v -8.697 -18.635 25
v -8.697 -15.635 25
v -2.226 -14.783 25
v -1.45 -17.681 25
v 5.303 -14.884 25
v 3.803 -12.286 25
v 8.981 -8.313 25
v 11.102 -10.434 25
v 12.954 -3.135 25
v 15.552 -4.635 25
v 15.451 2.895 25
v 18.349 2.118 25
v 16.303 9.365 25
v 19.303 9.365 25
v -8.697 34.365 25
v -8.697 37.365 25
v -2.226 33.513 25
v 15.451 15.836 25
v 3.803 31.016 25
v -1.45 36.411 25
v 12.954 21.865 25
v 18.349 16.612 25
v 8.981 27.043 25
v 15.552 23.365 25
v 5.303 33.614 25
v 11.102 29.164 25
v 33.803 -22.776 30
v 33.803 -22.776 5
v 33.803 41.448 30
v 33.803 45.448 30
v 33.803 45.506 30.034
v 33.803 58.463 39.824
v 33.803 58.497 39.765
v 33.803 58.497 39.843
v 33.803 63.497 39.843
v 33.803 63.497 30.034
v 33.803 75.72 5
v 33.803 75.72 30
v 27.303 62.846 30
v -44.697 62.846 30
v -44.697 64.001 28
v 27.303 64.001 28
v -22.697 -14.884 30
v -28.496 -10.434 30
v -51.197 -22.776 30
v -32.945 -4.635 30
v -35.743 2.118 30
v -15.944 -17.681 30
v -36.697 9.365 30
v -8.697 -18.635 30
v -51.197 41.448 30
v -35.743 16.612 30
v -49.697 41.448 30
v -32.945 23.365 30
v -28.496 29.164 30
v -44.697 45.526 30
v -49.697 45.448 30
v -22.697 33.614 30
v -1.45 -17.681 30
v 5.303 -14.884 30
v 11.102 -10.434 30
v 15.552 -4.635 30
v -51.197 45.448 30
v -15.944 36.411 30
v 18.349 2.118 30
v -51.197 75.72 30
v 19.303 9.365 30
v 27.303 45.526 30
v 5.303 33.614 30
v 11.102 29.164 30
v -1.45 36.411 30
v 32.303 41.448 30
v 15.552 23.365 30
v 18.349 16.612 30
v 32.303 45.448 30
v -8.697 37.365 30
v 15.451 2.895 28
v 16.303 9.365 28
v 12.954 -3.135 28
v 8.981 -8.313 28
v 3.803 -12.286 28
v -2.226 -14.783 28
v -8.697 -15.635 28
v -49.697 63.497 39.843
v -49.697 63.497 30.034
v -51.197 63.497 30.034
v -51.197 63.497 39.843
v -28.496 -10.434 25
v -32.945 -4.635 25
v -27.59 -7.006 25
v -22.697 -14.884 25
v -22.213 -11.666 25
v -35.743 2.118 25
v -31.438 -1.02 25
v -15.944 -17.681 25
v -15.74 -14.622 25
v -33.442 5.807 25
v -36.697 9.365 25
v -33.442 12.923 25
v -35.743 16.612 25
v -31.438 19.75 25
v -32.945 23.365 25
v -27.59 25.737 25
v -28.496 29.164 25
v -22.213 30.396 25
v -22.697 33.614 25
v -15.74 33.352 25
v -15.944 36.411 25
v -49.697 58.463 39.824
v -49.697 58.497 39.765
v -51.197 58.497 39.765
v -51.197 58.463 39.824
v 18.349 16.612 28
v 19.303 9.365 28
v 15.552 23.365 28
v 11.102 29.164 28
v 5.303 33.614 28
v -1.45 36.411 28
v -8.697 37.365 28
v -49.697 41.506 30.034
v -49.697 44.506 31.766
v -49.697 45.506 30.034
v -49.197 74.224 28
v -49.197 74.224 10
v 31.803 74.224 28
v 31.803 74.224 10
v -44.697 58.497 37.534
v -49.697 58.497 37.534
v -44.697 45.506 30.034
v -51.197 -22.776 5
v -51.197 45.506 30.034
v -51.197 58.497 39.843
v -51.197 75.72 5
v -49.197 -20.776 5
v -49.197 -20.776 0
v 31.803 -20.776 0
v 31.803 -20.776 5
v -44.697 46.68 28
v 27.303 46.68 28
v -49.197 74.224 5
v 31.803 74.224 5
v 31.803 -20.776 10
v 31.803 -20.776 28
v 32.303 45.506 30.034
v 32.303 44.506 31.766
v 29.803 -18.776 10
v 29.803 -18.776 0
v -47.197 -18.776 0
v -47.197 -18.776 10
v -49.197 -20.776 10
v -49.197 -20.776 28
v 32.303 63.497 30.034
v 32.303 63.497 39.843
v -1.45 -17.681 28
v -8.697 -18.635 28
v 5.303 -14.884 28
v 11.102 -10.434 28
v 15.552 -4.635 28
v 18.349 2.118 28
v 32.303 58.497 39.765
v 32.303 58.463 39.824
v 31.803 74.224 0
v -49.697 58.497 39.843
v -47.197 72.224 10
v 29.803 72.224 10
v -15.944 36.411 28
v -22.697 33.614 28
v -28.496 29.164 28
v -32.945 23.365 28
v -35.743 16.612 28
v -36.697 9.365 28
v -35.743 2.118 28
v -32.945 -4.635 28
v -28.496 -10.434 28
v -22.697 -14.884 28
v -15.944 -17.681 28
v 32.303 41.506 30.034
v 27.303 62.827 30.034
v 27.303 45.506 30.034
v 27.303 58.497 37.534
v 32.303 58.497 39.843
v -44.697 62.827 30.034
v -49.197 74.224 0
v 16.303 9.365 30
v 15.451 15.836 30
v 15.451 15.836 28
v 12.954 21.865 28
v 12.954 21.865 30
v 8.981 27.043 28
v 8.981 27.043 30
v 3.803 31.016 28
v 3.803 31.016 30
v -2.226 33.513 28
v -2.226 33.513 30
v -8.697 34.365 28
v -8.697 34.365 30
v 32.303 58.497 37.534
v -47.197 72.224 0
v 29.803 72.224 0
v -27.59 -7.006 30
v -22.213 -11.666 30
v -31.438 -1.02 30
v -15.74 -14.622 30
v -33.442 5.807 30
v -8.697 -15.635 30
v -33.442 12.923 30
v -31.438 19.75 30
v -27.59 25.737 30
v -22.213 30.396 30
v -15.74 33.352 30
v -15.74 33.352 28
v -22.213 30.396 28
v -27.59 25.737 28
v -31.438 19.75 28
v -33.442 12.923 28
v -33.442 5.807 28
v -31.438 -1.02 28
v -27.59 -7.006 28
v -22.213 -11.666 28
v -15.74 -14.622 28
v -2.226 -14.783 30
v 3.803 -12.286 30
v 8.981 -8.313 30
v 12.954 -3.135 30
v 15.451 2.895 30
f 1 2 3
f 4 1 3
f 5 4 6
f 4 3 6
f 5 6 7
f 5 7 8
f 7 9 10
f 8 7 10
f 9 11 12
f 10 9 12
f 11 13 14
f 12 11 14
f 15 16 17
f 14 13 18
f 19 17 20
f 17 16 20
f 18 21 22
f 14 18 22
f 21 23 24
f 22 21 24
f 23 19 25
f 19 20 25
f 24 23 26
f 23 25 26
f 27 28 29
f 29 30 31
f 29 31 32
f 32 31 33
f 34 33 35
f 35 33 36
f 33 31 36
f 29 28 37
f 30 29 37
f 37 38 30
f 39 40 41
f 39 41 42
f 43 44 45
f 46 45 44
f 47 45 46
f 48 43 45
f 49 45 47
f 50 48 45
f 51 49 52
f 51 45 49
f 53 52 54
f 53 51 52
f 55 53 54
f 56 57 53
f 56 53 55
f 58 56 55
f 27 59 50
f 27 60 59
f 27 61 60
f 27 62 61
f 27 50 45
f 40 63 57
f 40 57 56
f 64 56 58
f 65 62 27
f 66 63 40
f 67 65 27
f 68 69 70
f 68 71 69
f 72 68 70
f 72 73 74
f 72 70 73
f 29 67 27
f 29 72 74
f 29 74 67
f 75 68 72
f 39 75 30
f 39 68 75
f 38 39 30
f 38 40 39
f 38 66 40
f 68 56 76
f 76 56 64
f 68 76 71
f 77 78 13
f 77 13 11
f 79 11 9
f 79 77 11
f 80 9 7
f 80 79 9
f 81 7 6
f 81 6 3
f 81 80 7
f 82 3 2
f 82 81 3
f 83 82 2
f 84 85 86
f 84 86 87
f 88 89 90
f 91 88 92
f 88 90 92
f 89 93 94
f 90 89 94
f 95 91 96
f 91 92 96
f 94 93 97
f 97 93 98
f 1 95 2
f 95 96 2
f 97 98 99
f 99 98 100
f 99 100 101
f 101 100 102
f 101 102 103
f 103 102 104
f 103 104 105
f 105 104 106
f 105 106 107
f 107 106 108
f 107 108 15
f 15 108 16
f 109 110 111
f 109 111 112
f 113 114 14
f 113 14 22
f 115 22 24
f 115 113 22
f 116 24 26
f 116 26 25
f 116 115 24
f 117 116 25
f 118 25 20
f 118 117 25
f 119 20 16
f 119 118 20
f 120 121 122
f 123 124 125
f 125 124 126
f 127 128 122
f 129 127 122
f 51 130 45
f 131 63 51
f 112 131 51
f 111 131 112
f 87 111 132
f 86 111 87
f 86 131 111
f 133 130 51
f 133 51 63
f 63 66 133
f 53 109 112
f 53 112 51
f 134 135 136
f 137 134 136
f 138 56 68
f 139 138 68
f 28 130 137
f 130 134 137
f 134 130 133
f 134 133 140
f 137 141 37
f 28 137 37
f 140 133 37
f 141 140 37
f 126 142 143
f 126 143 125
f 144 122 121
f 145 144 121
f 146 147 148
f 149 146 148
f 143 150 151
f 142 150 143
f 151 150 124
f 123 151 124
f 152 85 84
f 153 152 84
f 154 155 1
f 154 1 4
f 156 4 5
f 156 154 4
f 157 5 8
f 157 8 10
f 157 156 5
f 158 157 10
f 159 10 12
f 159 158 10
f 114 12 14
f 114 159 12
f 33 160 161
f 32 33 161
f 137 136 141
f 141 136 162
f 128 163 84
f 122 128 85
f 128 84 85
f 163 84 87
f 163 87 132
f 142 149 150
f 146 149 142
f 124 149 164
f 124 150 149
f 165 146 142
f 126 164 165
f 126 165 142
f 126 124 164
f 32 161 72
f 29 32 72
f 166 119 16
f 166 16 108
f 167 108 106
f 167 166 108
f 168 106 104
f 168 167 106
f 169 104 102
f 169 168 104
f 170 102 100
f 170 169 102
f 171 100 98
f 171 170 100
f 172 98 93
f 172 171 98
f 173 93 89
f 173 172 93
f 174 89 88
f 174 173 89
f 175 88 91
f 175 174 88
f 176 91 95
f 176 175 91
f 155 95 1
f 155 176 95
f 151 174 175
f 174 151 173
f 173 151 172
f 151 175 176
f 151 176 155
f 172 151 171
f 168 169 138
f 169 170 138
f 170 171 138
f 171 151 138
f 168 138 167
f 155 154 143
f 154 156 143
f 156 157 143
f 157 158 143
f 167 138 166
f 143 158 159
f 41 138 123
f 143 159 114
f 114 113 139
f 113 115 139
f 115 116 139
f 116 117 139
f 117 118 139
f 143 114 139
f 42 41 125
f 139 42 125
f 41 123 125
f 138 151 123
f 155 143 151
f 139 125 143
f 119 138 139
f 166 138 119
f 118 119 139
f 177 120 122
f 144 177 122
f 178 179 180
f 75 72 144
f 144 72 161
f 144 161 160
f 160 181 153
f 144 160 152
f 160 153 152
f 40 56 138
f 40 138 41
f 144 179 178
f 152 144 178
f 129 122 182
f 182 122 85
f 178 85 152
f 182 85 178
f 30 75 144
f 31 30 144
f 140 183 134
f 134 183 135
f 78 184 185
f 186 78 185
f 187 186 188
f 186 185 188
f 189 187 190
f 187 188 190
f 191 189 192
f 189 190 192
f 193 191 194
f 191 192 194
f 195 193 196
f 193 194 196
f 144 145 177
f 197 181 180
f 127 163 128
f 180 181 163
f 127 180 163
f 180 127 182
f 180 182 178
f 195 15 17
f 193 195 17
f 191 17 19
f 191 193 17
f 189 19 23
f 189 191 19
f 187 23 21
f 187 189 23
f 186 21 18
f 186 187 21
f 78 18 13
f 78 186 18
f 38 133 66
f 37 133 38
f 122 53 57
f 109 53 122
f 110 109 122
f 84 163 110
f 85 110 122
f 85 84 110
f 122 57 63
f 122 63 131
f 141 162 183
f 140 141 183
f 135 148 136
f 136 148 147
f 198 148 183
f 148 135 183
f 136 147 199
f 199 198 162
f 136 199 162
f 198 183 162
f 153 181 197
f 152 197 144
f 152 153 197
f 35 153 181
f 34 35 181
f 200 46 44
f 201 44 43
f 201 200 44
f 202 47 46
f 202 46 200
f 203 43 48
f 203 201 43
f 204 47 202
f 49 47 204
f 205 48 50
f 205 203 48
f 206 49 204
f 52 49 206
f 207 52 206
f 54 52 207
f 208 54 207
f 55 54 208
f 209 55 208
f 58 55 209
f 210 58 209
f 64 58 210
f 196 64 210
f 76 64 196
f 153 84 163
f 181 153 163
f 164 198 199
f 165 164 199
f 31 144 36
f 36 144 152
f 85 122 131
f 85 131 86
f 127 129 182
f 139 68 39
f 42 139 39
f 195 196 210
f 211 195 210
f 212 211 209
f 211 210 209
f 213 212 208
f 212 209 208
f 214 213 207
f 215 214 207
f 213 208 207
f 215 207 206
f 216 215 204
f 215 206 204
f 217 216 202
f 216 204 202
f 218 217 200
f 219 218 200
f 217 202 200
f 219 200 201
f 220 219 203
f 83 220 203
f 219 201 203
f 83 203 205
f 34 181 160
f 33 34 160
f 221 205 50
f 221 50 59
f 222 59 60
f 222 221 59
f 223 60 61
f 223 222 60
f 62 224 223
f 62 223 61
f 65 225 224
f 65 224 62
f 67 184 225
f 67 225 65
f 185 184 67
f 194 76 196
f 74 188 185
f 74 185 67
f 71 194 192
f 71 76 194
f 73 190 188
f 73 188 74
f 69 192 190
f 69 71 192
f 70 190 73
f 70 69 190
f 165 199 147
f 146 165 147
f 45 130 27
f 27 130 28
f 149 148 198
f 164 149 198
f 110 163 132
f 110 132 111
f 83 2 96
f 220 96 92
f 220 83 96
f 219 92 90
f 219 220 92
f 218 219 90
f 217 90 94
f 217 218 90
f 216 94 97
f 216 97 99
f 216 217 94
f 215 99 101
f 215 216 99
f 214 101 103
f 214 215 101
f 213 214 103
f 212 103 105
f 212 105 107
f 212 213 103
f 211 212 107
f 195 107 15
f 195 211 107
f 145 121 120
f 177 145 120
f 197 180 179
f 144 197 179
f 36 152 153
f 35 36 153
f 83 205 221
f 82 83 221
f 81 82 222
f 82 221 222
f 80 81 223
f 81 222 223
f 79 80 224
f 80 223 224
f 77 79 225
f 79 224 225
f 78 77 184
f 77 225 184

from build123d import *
from build123d.topology import SkipClean

# Parameters (mm, degrees)
SKETCH1_W                  = 2
SKETCH1_H                  = 2
BOSS_EXTRUDE1_DEPTH        = 10
BOSS_EXTRUDE3_DEPTH        = 20
BOSS_EXTRUDE3_DEPTH_BACK   = 5
SKETCH2_W                  = 85
SKETCH2_H                  = 98.49643328
SKETCH2_W_2                = 81
SKETCH2_H_2                = 95
SKETCH3_W                  = 81
SKETCH3_H                  = 95
BOSS_EXTRUDE4_DEPTH        = 2
BOSS_EXTRUDE6_DEPTH        = 41
BOSS_EXTRUDE6_DEPTH_BACK   = 41
BOSS_EXTRUDE6_2_DEPTH      = 41
BOSS_EXTRUDE6_2_DEPTH_BACK = 41
BOSS_EXTRUDE7_DEPTH        = 1.5
SKETCH15_W                 = 72
SKETCH15_H                 = 15
CUT_EXTRUDE2_DEPTH         = 15
CUT_EXTRUDE3_DEPTH         = 10
BOSS_EXTRUDE8_DEPTH        = 5


# Read off the part's stored shape, not the designer's step: Boss-Extrude7
with BuildPart() as part:
    # Sketch1 → Boss-Extrude1 (new body)
    with BuildSketch(Plane.XY):
        Polygon((-49.196743418, -18.776119502), (-47.196743418, -18.776119502), (-47.196743418, 72.223880498), (-24.196743418, 72.223880498), (-22.196743418, 72.223880498), (29.803256582, 72.223880498), (29.803256582, 74.223880498), (-49.196743418, 74.223880498), align=None)
        Polygon((-24.196743418, -18.776119502), (-47.196743418, -18.776119502), (-47.196743418, -20.776119502), (31.803256582, -20.776119502), (31.803256582, 72.223880498), (29.803256582, 72.223880498), (29.803256582, -18.776119502), (-22.196743418, -18.776119502), align=None)
        with Locations((-48.196743418, -19.776119502)):
            Rectangle(SKETCH1_W, SKETCH1_H)
        with Locations((30.803256582, 73.223880498)):
            Rectangle(SKETCH1_W, SKETCH1_H)
    extrude(amount=BOSS_EXTRUDE1_DEPTH)

    # Sketch2 → Boss-Extrude3 (add, two sides: drawn at the far end of the back side and taken through both)
    with BuildSketch(Plane.XY.offset(10).offset(-BOSS_EXTRUDE3_DEPTH_BACK)):
        with Locations((-8.696743418, 26.472097138)):
            Rectangle(SKETCH2_W, SKETCH2_H)
        with Locations((-8.696743418, 26.723880498)):
            Rectangle(SKETCH2_W_2, SKETCH2_H_2, mode=Mode.SUBTRACT)
    extrude(amount=BOSS_EXTRUDE3_DEPTH + BOSS_EXTRUDE3_DEPTH_BACK)

    # Sketch3 → Boss-Extrude4 (add)
    with BuildSketch(Plane.XY.offset(30)):
        with Locations((-8.696743418, 26.723880498)):
            Rectangle(SKETCH3_W, SKETCH3_H)
    extrude(amount=-BOSS_EXTRUDE4_DEPTH)

    # Boss-Extrude7 outline → Boss-Extrude7 (add)
    with BuildSketch(Plane(origin=(32.303256582, 0, 0), x_dir=(0, 0, -1), z_dir=(1, 0, 0))):
        Polygon((-39.842927076, 63.496736875), (-39.842927076, 58.496736875), (-39.765386314, 58.496736875), (-39.823541886, 58.46316074), (-30, 41.448287084), (-30, 45.448287084), (-30.033525999, 45.506355818), (-30.033525999, 63.496736875), align=None)
    boss_extrude7 = extrude(amount=BOSS_EXTRUDE7_DEPTH)

    # Mirror2: Boss-Extrude7 across plane
    add(boss_extrude7.mirror(Plane(origin=(-8.696743418, 0, 0), x_dir=(0, 0, 1), z_dir=(1, 0, 0))))


with BuildPart() as body_2:
    # Sketch9 → Boss-Extrude6 (new, two sides: drawn at the far end of the back side and taken through both)
    with BuildSketch(Plane(origin=(-8.696743418, 0, 0), x_dir=(0, 0, -1), z_dir=(1, 0, 0)).offset(-BOSS_EXTRUDE6_DEPTH_BACK)):
        Polygon((-30.033525999, 45.506355818), (-30.033525999, 63.496736875), (-39.842927076, 63.496736875), (-39.842927076, 58.496736875), (-37.533525999, 58.496736875), align=None)
    extrude(amount=BOSS_EXTRUDE6_DEPTH + BOSS_EXTRUDE6_DEPTH_BACK)


with BuildPart() as body_3:
    # Sketch9 → Boss-Extrude6 2 (new, two sides: drawn at the far end of the back side and taken through both)
    with BuildSketch(Plane(origin=(-8.696743418, 0, 0), x_dir=(0, 0, -1), z_dir=(1, 0, 0)).offset(-BOSS_EXTRUDE6_2_DEPTH_BACK)):
        Polygon((-30.033525999, 41.506355818), (-30.033525999, 45.506355818), (-31.765576807, 44.506355818), align=None)
    extrude(amount=BOSS_EXTRUDE6_2_DEPTH + BOSS_EXTRUDE6_2_DEPTH_BACK)


with BuildPart() as cut_extrude2_tool:
    # Sketch15 → Cut-Extrude2 (new body)
    with BuildSketch(Plane(origin=(0, -1.628309286, 2.820314413), x_dir=(1, 0, 0), z_dir=(0, -0.5000000000000001, 0.8660254037844386))):
        with Locations((-8.696743418, 61.926423172)):
            Rectangle(SKETCH15_W, SKETCH15_H)
    extrude(amount=-CUT_EXTRUDE2_DEPTH)


with BuildPart() as part_1:
    add(part.part)

    # Cut-Extrude2: cut by cut_extrude2_tool
    add(cut_extrude2_tool.part, mode=Mode.SUBTRACT)

    # Sketch16 → Cut-Extrude3 (cut)
    with BuildSketch(Plane.XY.offset(30)):
        with BuildLine():
            ThreePointArc((-8.696743418, 34.365118158), (-33.696743418, 9.365118158), (-8.696743418, -15.634881842))
            Line((-8.696743418, -15.634881842), (-8.696743418, 34.365118158))
        make_face()
        with BuildLine():
            Line((-8.696743418, 34.365118158), (-8.696743418, -15.634881842))
            ThreePointArc((-8.696743418, -15.634881842), (8.980926112, -8.312551372), (16.303256582, 9.365118158))
            ThreePointArc((16.303256582, 9.365118158), (8.980926112, 27.042787688), (-8.696743418, 34.365118158))
        make_face()
    extrude(amount=-CUT_EXTRUDE3_DEPTH, mode=Mode.SUBTRACT)

    # Sketch16<3> → Boss-Extrude8 (add)
    with SkipClean():  # the faces are left unmerged after this step: merging them gives an invalid solid
        with BuildSketch(Plane.XY.offset(30)):
            with BuildLine():
                ThreePointArc((-8.696743418, 37.365118158), (-36.696743418, 9.365118158), (-8.696743418, -18.634881842))
                Line((-8.696743418, -18.634881842), (-8.696743418, -15.634881842))
                ThreePointArc((-8.696743418, -15.634881842), (-33.696743418, 9.365118158), (-8.696743418, 34.365118158))
                Line((-8.696743418, 34.365118158), (-8.696743418, 37.365118158))
            make_face()
            with BuildLine():
                Line((-8.696743418, -15.634881842), (-8.696743418, -18.634881842))
                ThreePointArc((-8.696743418, -18.634881842), (11.102246456, -10.433871715), (19.303256582, 9.365118158))
                ThreePointArc((19.303256582, 9.365118158), (11.102246456, 29.164108031), (-8.696743418, 37.365118158))
                Line((-8.696743418, 37.365118158), (-8.696743418, 34.365118158))
                ThreePointArc((-8.696743418, 34.365118158), (8.980926112, 27.042787688), (16.303256582, 9.365118158))
                ThreePointArc((16.303256582, 9.365118158), (8.980926112, -8.312551372), (-8.696743418, -15.634881842))
            make_face()
        extrude(amount=-BOSS_EXTRUDE8_DEPTH)


with BuildPart() as body_2_1:
    add(body_2.part)

    # Cut-Extrude2: cut by cut_extrude2_tool
    add(cut_extrude2_tool.part, mode=Mode.SUBTRACT)


solid = Compound([body_3.part, part_1.part, body_2_1.part])
